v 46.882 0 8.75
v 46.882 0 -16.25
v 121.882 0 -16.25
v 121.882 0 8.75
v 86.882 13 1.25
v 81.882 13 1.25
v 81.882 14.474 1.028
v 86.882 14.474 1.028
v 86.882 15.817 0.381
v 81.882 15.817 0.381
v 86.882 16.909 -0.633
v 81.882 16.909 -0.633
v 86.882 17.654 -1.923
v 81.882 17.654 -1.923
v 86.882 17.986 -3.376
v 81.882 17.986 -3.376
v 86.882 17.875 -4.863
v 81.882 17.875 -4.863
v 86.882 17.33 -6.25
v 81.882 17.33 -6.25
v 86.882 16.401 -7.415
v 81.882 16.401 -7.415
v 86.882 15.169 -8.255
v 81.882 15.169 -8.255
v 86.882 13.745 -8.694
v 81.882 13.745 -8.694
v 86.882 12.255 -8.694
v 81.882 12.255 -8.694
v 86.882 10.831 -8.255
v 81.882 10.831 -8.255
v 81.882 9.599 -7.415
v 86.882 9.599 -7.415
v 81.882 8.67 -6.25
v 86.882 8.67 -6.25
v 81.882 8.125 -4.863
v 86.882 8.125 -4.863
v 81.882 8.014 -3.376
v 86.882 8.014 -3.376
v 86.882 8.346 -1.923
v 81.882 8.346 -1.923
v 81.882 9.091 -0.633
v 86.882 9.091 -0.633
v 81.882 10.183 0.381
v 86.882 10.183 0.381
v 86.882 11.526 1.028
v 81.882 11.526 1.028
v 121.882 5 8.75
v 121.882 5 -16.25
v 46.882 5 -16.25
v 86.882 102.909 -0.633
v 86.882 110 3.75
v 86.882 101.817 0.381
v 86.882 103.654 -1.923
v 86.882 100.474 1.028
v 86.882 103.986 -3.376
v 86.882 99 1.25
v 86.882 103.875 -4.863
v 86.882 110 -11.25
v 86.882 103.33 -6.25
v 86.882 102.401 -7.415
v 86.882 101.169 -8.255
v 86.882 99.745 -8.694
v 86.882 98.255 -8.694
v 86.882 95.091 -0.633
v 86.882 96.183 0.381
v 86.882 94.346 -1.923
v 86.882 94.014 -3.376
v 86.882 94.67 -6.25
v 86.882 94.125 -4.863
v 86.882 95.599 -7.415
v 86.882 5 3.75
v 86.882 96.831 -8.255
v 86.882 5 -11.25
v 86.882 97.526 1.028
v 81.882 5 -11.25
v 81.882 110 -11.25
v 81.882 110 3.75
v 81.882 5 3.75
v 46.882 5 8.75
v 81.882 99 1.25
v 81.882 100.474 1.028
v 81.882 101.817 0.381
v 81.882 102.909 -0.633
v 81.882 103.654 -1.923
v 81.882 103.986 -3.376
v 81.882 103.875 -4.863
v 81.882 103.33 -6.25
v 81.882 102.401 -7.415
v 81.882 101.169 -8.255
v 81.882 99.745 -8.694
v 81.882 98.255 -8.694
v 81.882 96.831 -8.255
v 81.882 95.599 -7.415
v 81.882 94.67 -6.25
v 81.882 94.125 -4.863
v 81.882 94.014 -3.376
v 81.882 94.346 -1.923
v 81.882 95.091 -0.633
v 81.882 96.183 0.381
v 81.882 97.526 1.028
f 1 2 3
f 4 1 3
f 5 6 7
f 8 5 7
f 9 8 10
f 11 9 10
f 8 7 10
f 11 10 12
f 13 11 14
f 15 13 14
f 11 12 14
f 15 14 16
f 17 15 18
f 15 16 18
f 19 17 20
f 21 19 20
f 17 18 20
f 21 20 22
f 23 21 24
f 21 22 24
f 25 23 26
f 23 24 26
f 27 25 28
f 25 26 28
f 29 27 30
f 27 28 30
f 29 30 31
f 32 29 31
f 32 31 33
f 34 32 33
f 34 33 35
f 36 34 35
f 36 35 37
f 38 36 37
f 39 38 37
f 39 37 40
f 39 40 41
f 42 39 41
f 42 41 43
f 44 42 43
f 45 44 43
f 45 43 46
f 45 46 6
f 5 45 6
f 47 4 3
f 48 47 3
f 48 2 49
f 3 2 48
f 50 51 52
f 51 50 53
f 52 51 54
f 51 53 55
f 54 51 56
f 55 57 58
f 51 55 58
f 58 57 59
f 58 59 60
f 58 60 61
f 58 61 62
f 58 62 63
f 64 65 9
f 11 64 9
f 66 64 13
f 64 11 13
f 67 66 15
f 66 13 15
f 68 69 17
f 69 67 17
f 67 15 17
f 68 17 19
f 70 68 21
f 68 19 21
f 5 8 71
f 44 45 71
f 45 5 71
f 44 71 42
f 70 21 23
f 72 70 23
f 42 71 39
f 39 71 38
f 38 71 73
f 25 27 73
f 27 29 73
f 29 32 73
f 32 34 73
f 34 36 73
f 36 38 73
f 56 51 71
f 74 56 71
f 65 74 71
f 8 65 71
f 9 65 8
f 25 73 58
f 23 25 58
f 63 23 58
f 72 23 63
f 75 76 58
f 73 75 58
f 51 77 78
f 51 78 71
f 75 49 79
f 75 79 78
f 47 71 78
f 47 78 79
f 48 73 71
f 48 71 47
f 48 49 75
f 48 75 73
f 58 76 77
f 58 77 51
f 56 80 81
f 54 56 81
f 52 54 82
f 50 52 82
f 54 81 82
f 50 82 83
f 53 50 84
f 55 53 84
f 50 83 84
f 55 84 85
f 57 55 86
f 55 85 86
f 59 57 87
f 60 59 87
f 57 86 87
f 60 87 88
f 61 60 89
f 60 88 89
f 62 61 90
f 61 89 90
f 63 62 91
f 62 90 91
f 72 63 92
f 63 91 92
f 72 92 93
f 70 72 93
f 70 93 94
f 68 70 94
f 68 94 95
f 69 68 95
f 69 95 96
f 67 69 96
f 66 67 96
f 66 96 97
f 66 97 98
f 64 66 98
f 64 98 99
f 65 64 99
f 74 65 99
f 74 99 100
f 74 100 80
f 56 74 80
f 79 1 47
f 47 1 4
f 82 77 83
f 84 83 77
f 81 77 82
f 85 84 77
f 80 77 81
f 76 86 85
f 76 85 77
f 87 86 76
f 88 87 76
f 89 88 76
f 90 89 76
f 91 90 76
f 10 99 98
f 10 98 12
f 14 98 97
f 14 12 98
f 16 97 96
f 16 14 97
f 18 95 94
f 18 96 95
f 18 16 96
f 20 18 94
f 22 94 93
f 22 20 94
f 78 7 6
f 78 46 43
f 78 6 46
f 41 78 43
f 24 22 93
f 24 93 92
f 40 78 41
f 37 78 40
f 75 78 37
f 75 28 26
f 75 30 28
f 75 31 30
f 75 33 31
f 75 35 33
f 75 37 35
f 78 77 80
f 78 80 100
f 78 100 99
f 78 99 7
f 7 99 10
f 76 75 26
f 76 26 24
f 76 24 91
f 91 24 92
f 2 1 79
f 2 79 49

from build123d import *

# Parameters (mm, degrees)
SKETCH1_W           = 75
SKETCH1_H           = 25
BOSS_EXTRUDE1_DEPTH = 5
SKETCH2_W           = 5
SKETCH2_H           = 15
BOSS_EXTRUDE3_DEPTH = 105
SKETCH3_R           = 5
CUT_EXTRUDE1_DEPTH  = 41
SKETCH4_R           = 5
CUT_EXTRUDE2_DEPTH  = 41


with BuildPart() as part:
    # Sketch1 → Boss-Extrude1 (new body)
    with BuildSketch(Plane(origin=(0, 0, 0), x_dir=(1, 0, 0), z_dir=(0, 1, 0))):
        with Locations((84.381711682, 3.75)):
            Rectangle(SKETCH1_W, SKETCH1_H)
    extrude(amount=BOSS_EXTRUDE1_DEPTH)

    # Sketch2 → Boss-Extrude3 (add)
    with BuildSketch(Plane(origin=(0, 5, 0), x_dir=(1, 0, 0), z_dir=(0, 1, 0))):
        with Locations((84.381711682, 3.75)):
            Rectangle(SKETCH2_W, SKETCH2_H)
    extrude(amount=BOSS_EXTRUDE3_DEPTH)

    # Sketch3 → Cut-Extrude1 (cut, through all)
    with BuildSketch(Plane.ZY.offset(-81.881711682)):
        with Locations((-3.75, 13)):
            Circle(SKETCH3_R)
    extrude(amount=-CUT_EXTRUDE1_DEPTH, mode=Mode.SUBTRACT)

    # Sketch4 → Cut-Extrude2 (cut, through all)
    with BuildSketch(Plane.ZY.offset(-81.881711682)):
        with Locations((-3.75, 99)):
            Circle(SKETCH4_R)
    extrude(amount=-CUT_EXTRUDE2_DEPTH, mode=Mode.SUBTRACT)


solid = part.part
